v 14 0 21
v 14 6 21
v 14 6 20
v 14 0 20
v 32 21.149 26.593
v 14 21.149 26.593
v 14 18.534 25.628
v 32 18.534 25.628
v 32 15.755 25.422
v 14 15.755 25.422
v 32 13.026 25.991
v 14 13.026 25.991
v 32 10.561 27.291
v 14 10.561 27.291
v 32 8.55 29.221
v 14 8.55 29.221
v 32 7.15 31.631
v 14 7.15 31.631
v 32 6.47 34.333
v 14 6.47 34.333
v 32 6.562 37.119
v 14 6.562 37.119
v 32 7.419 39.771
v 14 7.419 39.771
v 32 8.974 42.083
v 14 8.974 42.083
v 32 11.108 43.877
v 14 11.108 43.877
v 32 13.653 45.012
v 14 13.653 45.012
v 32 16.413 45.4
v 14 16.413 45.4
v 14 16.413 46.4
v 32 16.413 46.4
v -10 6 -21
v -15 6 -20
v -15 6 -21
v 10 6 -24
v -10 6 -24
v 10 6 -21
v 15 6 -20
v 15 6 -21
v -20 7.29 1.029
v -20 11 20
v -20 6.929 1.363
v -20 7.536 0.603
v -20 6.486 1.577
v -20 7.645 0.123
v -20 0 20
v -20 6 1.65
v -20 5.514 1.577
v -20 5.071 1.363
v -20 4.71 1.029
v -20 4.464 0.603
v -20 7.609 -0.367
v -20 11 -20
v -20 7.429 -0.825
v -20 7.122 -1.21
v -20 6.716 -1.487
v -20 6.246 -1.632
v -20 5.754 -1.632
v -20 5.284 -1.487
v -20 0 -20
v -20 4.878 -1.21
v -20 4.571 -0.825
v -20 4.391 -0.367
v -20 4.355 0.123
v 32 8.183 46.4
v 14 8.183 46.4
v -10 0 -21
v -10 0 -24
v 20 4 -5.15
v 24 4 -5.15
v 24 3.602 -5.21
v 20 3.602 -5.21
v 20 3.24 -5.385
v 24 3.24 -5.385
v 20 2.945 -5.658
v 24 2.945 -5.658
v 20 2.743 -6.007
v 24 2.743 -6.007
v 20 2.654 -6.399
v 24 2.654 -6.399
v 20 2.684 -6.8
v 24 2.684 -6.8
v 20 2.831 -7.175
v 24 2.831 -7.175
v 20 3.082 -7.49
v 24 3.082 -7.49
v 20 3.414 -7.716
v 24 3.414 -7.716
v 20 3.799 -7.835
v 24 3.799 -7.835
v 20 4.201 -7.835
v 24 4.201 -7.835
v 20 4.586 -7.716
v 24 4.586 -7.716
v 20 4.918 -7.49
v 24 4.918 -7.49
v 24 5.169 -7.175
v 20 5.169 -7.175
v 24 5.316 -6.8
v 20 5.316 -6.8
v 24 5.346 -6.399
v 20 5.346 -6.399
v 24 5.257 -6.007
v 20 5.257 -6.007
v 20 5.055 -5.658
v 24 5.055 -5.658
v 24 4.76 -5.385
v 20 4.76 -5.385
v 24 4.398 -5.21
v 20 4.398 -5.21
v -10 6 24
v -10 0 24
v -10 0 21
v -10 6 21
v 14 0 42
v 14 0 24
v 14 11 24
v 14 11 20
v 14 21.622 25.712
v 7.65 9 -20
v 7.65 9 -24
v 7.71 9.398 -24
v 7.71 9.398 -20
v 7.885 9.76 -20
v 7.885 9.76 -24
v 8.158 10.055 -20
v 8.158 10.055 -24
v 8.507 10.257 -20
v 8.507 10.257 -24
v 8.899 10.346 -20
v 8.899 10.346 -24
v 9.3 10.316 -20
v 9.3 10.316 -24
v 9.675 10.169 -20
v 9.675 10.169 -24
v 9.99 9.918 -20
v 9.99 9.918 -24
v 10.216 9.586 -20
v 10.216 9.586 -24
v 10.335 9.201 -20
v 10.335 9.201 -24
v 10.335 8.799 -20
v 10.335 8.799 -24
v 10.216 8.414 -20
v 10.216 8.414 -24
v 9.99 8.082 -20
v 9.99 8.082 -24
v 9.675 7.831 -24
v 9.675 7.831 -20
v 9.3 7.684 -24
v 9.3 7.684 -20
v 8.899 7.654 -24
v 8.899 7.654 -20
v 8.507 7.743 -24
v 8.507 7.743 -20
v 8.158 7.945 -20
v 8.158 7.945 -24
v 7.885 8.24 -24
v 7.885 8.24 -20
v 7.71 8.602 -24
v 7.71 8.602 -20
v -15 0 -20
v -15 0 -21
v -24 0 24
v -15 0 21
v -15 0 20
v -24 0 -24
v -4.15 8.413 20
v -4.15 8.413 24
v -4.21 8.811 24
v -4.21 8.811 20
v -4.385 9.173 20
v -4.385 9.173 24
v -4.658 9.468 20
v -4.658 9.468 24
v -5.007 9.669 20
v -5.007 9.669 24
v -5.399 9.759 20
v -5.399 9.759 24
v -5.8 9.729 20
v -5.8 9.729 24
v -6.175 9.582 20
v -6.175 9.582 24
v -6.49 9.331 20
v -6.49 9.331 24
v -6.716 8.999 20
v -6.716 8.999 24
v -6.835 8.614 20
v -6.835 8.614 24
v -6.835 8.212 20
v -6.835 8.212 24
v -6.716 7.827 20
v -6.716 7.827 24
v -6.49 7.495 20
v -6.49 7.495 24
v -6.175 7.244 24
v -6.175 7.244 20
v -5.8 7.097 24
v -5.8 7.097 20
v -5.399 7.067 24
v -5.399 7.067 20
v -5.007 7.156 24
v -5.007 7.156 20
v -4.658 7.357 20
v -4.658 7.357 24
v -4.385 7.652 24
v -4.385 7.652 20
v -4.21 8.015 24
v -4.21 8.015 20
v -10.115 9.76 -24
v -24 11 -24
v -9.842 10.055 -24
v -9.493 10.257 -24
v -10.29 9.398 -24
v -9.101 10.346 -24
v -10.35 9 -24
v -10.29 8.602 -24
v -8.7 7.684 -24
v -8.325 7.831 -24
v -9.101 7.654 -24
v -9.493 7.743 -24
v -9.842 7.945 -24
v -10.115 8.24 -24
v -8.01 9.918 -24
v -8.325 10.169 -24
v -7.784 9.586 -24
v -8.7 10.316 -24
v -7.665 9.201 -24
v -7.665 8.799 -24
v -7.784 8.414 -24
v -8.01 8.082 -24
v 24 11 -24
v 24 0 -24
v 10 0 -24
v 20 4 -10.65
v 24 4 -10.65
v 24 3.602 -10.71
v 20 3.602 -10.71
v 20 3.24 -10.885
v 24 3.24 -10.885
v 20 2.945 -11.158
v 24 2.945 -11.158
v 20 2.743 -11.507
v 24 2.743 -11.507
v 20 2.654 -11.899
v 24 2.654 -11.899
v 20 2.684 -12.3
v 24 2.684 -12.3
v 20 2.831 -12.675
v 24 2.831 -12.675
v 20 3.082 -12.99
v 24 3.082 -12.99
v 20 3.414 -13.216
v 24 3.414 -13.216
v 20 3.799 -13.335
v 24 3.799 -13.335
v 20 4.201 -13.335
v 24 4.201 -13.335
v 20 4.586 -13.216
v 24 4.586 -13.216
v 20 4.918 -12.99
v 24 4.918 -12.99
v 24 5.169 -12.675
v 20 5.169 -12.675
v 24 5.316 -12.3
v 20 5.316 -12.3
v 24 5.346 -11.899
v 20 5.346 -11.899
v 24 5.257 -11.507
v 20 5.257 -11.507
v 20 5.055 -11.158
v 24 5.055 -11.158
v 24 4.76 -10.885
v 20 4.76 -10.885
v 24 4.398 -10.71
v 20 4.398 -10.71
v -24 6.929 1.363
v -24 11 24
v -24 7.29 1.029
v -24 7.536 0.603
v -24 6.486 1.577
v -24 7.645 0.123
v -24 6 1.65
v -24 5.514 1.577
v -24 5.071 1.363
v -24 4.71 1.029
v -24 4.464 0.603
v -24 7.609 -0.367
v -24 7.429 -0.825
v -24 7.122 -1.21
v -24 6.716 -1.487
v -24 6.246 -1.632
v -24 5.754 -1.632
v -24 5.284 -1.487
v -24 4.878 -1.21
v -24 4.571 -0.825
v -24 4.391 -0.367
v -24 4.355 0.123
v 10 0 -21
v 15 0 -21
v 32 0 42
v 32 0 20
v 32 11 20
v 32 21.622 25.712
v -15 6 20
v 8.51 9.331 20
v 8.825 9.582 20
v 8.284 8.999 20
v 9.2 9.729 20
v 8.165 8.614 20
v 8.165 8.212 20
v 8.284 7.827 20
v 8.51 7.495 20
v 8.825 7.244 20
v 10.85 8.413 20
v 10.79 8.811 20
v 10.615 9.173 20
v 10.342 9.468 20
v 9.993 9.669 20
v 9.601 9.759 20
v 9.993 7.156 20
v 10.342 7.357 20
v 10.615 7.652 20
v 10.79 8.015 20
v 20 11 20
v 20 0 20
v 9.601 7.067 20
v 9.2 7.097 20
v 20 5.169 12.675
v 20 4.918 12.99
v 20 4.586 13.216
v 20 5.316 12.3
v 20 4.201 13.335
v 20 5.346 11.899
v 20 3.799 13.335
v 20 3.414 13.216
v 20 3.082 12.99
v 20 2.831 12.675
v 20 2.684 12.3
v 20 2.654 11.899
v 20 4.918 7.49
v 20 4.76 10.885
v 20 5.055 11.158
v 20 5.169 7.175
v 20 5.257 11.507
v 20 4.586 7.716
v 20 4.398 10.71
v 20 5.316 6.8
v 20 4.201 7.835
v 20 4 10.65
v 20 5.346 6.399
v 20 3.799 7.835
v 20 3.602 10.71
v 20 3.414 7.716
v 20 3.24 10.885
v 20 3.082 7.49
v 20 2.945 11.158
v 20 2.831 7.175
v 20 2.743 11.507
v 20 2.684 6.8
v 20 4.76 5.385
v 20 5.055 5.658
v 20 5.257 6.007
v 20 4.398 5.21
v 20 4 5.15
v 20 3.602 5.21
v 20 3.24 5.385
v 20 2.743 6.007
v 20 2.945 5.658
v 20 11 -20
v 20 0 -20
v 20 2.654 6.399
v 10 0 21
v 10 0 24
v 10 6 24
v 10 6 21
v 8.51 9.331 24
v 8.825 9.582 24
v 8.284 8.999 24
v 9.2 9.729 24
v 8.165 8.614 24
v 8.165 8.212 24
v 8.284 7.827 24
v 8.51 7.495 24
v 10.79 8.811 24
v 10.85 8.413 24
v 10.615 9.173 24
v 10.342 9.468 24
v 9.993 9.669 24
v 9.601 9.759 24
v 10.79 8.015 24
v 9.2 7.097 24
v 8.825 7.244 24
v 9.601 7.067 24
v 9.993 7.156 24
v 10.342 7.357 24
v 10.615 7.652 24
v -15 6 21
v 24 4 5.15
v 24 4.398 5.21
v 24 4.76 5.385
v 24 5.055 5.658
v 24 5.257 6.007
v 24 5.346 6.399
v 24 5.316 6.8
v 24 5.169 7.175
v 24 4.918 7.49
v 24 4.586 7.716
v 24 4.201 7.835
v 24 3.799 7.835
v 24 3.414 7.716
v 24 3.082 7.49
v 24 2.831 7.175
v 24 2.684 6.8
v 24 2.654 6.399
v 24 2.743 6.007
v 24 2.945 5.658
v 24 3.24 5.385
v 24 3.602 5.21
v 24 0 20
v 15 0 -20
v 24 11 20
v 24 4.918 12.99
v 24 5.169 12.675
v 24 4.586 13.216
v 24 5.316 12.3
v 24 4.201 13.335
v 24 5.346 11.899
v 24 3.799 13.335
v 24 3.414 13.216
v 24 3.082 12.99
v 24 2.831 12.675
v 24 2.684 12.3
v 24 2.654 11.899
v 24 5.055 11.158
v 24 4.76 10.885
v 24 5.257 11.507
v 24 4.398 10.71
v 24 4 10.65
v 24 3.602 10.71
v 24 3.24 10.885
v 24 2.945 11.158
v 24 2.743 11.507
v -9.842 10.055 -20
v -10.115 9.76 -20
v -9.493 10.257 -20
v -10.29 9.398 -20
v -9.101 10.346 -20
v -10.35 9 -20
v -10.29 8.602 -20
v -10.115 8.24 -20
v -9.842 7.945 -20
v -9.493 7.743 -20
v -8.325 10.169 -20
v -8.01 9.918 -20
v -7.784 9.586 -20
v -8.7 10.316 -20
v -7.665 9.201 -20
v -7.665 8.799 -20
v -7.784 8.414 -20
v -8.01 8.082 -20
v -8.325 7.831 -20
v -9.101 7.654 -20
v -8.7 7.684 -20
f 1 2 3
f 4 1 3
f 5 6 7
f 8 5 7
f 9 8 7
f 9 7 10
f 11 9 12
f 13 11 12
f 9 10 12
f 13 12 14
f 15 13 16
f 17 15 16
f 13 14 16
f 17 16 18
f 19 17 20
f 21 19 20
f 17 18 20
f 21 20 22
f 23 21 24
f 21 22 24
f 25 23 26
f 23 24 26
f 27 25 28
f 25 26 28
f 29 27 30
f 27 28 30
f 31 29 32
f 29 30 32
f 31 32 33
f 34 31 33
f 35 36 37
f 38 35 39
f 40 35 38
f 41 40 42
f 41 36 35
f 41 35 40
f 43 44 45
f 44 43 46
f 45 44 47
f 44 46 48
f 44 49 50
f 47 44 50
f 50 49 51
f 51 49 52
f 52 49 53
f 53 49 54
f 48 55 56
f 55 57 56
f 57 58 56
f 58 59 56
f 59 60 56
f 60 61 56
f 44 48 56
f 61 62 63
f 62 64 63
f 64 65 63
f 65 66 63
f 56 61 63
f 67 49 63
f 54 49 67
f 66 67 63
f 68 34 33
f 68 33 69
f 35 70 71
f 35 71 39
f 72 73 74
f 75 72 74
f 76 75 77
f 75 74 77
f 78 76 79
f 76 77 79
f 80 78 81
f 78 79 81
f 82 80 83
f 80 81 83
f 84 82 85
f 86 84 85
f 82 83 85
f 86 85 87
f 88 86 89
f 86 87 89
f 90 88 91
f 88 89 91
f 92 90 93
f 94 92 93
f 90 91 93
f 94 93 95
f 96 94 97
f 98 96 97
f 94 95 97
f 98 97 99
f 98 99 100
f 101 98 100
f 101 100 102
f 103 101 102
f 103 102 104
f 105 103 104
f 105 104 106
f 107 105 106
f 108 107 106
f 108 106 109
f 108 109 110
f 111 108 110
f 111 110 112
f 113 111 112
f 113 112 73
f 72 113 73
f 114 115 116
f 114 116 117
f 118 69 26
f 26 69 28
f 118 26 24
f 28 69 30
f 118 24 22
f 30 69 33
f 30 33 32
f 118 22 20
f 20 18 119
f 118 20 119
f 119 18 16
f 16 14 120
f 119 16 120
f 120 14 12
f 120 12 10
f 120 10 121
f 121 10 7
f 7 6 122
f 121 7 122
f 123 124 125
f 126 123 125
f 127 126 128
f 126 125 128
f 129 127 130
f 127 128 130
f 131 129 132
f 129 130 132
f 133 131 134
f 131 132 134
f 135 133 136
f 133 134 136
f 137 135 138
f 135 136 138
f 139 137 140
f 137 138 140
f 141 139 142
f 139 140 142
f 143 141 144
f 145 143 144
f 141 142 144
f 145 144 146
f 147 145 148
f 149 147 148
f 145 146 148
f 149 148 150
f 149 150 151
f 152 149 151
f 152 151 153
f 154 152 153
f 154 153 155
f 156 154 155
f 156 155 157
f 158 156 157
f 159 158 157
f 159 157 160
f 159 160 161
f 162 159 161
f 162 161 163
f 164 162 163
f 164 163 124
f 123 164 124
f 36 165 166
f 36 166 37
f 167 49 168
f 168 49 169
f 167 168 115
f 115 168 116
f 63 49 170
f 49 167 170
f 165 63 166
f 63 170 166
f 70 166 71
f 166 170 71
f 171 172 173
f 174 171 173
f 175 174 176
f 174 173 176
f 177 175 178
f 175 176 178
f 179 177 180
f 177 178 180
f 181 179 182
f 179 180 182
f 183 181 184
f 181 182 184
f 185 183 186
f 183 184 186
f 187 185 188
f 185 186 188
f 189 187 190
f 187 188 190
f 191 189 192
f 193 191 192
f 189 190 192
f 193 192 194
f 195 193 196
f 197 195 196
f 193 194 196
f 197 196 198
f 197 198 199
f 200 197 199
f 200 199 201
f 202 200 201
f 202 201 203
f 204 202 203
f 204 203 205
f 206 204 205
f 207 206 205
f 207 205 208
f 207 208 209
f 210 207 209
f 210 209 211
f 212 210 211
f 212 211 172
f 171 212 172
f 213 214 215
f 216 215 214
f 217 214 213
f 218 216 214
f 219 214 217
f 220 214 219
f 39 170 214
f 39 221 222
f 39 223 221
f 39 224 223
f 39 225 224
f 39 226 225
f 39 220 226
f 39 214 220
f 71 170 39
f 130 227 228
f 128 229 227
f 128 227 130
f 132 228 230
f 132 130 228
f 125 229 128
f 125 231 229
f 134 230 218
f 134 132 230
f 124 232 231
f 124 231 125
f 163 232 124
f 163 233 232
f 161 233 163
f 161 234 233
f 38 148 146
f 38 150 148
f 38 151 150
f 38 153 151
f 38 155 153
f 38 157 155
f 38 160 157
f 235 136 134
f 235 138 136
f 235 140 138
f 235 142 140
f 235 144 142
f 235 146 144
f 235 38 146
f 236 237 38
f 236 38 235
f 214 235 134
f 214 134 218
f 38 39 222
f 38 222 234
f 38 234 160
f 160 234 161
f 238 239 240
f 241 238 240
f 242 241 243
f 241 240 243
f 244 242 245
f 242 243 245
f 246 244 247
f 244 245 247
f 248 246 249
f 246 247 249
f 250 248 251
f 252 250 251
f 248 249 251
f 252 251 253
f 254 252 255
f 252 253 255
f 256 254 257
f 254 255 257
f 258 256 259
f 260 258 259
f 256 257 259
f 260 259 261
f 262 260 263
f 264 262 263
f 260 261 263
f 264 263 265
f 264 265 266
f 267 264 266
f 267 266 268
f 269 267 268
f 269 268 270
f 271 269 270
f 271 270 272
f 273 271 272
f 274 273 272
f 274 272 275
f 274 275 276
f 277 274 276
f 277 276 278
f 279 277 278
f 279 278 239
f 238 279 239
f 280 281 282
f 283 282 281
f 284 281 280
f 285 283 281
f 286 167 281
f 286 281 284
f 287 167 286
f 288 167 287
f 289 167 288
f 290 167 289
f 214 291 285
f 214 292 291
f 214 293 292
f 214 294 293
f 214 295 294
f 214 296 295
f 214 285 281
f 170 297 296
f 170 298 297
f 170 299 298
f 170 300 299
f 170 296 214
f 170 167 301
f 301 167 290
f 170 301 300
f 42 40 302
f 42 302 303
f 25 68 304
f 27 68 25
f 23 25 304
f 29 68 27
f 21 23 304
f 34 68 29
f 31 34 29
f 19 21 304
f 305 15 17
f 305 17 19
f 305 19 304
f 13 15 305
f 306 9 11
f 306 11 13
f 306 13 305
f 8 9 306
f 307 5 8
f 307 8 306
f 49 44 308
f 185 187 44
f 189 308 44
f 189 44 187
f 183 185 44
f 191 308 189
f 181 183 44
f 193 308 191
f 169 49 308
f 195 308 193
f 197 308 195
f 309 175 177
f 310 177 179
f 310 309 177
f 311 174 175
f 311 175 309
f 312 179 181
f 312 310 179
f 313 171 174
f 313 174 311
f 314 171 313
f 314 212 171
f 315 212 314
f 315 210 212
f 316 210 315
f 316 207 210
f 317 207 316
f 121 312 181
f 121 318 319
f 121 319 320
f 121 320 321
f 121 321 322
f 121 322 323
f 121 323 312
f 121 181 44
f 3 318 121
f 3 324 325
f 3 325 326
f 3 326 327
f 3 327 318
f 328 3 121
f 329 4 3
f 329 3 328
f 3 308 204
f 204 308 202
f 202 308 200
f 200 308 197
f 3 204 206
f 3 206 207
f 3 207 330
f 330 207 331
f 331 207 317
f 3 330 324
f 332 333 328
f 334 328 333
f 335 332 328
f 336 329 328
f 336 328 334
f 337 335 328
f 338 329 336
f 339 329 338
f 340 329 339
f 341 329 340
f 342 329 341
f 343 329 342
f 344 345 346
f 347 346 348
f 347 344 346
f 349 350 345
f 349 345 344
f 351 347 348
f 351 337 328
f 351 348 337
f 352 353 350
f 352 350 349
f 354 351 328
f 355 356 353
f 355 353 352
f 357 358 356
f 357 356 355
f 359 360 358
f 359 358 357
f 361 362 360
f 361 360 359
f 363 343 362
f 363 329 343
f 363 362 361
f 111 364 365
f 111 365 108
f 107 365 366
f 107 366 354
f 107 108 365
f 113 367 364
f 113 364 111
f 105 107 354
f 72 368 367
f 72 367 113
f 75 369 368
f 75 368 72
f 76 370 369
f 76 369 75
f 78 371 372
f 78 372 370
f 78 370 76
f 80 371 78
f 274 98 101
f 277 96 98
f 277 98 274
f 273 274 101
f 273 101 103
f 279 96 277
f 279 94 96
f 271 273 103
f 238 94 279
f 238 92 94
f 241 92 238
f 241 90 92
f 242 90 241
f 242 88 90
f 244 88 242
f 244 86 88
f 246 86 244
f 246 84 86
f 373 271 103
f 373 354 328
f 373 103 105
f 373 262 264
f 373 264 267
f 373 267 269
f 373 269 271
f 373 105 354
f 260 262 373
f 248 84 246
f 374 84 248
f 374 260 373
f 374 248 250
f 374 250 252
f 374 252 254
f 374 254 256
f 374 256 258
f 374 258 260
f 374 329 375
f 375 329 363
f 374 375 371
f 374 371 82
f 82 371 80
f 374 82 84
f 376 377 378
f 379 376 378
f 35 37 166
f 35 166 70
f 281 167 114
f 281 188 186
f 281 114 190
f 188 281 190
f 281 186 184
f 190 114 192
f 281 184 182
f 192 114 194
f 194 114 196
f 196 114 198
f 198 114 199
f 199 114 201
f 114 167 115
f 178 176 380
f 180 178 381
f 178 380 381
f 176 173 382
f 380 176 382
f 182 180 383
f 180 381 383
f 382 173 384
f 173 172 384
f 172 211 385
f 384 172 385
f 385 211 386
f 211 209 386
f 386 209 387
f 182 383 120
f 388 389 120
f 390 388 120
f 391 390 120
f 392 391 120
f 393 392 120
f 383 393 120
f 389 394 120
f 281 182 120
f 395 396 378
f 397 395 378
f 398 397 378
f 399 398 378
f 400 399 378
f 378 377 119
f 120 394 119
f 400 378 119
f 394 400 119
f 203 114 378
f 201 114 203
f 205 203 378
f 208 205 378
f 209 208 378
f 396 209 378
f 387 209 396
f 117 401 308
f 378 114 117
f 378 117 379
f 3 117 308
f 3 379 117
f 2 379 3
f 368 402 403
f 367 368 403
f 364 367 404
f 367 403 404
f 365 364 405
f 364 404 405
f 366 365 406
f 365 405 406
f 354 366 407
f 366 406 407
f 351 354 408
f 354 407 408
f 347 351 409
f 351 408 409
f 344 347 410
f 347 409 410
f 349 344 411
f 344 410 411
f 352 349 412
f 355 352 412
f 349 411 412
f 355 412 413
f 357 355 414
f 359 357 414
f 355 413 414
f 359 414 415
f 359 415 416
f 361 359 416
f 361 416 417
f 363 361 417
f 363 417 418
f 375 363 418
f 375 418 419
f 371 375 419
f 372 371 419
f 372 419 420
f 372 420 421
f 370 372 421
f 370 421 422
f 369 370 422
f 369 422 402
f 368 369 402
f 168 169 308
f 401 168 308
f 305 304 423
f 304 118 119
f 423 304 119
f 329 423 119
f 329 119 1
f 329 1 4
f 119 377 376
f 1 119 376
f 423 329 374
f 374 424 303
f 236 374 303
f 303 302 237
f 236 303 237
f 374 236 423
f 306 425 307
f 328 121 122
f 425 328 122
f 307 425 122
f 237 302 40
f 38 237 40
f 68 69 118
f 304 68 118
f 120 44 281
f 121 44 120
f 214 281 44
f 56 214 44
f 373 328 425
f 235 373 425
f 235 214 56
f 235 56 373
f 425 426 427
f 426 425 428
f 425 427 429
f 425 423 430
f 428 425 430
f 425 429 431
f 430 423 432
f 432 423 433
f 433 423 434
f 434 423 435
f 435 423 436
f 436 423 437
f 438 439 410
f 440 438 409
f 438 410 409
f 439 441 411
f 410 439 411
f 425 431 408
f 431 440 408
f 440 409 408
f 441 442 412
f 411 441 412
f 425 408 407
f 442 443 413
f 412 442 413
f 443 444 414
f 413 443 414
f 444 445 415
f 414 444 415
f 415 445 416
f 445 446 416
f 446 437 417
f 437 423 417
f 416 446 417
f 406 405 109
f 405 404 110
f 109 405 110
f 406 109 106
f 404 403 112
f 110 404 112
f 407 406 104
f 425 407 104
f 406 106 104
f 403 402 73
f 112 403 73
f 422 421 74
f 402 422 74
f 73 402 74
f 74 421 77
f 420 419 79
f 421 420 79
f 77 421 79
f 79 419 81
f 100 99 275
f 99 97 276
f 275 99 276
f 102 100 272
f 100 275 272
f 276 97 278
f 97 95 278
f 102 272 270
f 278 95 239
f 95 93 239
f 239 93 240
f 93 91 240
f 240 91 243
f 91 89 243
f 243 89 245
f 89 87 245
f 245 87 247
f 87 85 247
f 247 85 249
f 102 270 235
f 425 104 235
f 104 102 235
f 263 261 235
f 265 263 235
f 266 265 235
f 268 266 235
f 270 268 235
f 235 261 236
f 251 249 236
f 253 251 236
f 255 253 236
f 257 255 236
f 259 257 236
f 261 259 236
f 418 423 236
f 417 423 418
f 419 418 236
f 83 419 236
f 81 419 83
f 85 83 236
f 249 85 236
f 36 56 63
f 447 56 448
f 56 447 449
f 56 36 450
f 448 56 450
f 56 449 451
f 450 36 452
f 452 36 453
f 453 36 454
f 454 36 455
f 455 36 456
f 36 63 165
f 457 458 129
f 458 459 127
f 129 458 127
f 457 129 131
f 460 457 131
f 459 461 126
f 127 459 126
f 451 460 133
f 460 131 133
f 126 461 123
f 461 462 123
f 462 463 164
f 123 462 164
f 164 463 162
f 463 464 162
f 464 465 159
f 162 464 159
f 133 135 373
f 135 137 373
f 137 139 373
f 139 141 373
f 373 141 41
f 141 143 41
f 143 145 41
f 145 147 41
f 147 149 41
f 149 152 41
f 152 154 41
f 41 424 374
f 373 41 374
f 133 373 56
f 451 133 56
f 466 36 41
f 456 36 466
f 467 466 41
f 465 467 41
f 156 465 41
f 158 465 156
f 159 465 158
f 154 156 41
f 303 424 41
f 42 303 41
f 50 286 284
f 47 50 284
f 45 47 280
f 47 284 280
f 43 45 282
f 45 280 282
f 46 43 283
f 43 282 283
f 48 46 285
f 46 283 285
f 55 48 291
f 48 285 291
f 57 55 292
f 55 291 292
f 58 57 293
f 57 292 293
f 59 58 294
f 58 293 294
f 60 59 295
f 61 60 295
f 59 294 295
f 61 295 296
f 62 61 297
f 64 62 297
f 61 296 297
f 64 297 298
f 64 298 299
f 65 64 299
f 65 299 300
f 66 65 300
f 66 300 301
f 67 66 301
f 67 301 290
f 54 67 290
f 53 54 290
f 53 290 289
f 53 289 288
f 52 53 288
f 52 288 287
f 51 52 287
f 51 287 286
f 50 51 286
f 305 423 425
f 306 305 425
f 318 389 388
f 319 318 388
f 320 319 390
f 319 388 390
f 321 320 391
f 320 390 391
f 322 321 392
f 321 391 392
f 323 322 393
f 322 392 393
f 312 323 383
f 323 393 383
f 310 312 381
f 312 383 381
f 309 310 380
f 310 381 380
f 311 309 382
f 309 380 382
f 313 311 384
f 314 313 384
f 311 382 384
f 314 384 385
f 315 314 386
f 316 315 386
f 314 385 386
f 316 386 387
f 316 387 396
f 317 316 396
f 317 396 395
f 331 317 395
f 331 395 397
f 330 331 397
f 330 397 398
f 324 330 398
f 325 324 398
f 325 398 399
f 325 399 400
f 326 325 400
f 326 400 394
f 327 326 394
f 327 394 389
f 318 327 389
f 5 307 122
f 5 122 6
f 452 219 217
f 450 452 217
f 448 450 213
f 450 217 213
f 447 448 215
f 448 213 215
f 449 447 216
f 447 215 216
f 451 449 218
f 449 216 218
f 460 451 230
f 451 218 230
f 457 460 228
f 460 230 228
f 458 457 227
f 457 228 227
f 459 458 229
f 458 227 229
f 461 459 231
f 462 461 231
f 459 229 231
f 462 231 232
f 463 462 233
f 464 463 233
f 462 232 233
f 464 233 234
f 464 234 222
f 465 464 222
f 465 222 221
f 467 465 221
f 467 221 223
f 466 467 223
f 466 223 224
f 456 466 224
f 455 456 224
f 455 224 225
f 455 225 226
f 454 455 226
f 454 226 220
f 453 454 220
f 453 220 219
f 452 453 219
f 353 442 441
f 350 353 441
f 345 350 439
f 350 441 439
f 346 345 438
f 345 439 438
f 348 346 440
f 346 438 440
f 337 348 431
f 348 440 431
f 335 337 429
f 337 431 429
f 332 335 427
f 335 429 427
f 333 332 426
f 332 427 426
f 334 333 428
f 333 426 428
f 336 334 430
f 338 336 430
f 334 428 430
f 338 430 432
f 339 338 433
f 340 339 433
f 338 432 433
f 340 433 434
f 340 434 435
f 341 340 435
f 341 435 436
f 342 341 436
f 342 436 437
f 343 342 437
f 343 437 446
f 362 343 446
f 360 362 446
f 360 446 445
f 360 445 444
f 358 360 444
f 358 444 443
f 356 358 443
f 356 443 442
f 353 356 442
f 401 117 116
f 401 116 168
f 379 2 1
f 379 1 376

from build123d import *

# Parameters (mm, degrees)
SKETCH1_W                = 48
SKETCH1_H                = 48
SKETCH1_W_2              = 40
SKETCH1_H_2              = 40
BOSS_EXTRUDE1_DEPTH      = 11
SKETCH3_W                = 20
SKETCH3_H                = 6
CUT_EXTRUDE1_DEPTH       = 55.781383699
SKETCH4_W                = 5
SKETCH4_H                = 6
CUT_EXTRUDE2_DEPTH       = 1
SKETCH5_W                = 5
SKETCH5_H                = 6
CUT_EXTRUDE3_DEPTH       = 1
CUT_EXTRUDE4_REACH       = 56.781
SKETCH6_R                = 1.35
CUT_EXTRUDE5_REACH       = 56.781
SKETCH7_R                = 1.35
CUT_EXTRUDE6_REACH       = 56.781
SKETCH8_R                = 1.35
CUT_EXTRUDE7_REACH       = 56.781
SKETCH9_R                = 1.65
BOSS_EXTRUDE7_DEPTH      = 8
BOSS_EXTRUDE7_DEPTH_BACK = 10


with BuildPart() as part:
    # Sketch1 → Boss-Extrude1 (new body)
    with BuildSketch(Plane(origin=(0, 0, 0), x_dir=(1, 0, 0), z_dir=(0, 1, 0))):
        Rectangle(SKETCH1_W, SKETCH1_H)
        Rectangle(SKETCH1_W_2, SKETCH1_H_2, mode=Mode.SUBTRACT)
    extrude(amount=BOSS_EXTRUDE1_DEPTH)

    # Sketch3 → Cut-Extrude1 (cut, through all)
    with BuildSketch(Plane.XY.offset(24)):
        with Locations((0, 3)):
            Rectangle(SKETCH3_W, SKETCH3_H)
    extrude(amount=-CUT_EXTRUDE1_DEPTH, mode=Mode.SUBTRACT)

    # Sketch4 → Cut-Extrude2 (cut)
    with BuildSketch(Plane.XY.offset(-20)):
        with Locations((-12.5, 3)):
            Rectangle(SKETCH4_W, SKETCH4_H)
        with Locations((12.5, 3)):
            Rectangle(SKETCH4_W, SKETCH4_H)
    extrude(amount=-CUT_EXTRUDE2_DEPTH, mode=Mode.SUBTRACT)

    # Sketch5 → Cut-Extrude3 (cut)
    with BuildSketch(Plane(origin=(0, 0, 20), x_dir=(-1, 0, 0), z_dir=(0, 0, -1))):
        with Locations((-12.5, 3)):
            Rectangle(SKETCH5_W, SKETCH5_H)
        with Locations((12.5, 3)):
            Rectangle(SKETCH5_W, SKETCH5_H)
    extrude(amount=-CUT_EXTRUDE3_DEPTH, mode=Mode.SUBTRACT)

    # Sketch6 → Cut-Extrude4 (cut, up to next)
    with BuildSketch(Plane(origin=(0, 0, -24), x_dir=(-1, 0, 0), z_dir=(0, 0, -1)), mode=Mode.PRIVATE) as cut_extrude4_sk1:
        with Locations((-9, 9)):
            Circle(SKETCH6_R)
    cut_extrude4_tool1 = extrude(cut_extrude4_sk1.sketch, amount=-CUT_EXTRUDE4_REACH, mode=Mode.PRIVATE) & part.part
    # Sketch6 → Cut-Extrude4 (cut, up to next)
    with BuildSketch(Plane(origin=(0, 0, -24), x_dir=(-1, 0, 0), z_dir=(0, 0, -1)), mode=Mode.PRIVATE) as cut_extrude4_sk2:
        with Locations((9, 9)):
            Circle(SKETCH6_R)
    cut_extrude4_tool2 = extrude(cut_extrude4_sk2.sketch, amount=-CUT_EXTRUDE4_REACH, mode=Mode.PRIVATE) & part.part
    add(cut_extrude4_tool1.solids().sort_by_distance((9, 9, -24))[0], mode=Mode.SUBTRACT)
    add(cut_extrude4_tool2.solids().sort_by_distance((-9, 9, -24))[0], mode=Mode.SUBTRACT)

    # Sketch7 → Cut-Extrude5 (cut, up to next)
    with BuildSketch(Plane.XY.offset(24), mode=Mode.PRIVATE) as cut_extrude5_sk1:
        with Locations((9.5, 8.412816521)):
            Circle(SKETCH7_R)
    cut_extrude5_tool1 = extrude(cut_extrude5_sk1.sketch, amount=-CUT_EXTRUDE5_REACH, mode=Mode.PRIVATE) & part.part
    # Sketch7 → Cut-Extrude5 (cut, up to next)
    with BuildSketch(Plane.XY.offset(24), mode=Mode.PRIVATE) as cut_extrude5_sk2:
        with Locations((-5.5, 8.412816521)):
            Circle(SKETCH7_R)
    cut_extrude5_tool2 = extrude(cut_extrude5_sk2.sketch, amount=-CUT_EXTRUDE5_REACH, mode=Mode.PRIVATE) & part.part
    add(cut_extrude5_tool1.solids().sort_by_distance((9.5, 8.412817, 24))[0], mode=Mode.SUBTRACT)
    add(cut_extrude5_tool2.solids().sort_by_distance((-5.5, 8.412817, 24))[0], mode=Mode.SUBTRACT)

    # Sketch8 → Cut-Extrude6 (cut, up to next)
    with BuildSketch(Plane(origin=(24, 0, 0), x_dir=(0, 0, -1), z_dir=(1, 0, 0)), mode=Mode.PRIVATE) as cut_extrude6_sk1:
        with Locations((-12, 4)):
            Circle(SKETCH8_R)
    cut_extrude6_tool1 = extrude(cut_extrude6_sk1.sketch, amount=-CUT_EXTRUDE6_REACH, mode=Mode.PRIVATE) & part.part
    # Sketch8 → Cut-Extrude6 (cut, up to next)
    with BuildSketch(Plane(origin=(24, 0, 0), x_dir=(0, 0, -1), z_dir=(1, 0, 0)), mode=Mode.PRIVATE) as cut_extrude6_sk2:
        with Locations((-6.5, 4)):
            Circle(SKETCH8_R)
    cut_extrude6_tool2 = extrude(cut_extrude6_sk2.sketch, amount=-CUT_EXTRUDE6_REACH, mode=Mode.PRIVATE) & part.part
    # Sketch8 → Cut-Extrude6 (cut, up to next)
    with BuildSketch(Plane(origin=(24, 0, 0), x_dir=(0, 0, -1), z_dir=(1, 0, 0)), mode=Mode.PRIVATE) as cut_extrude6_sk3:
        with Locations(Location((6.5, 4, 0), (0, 0, 180))):
            Circle(SKETCH8_R)
    cut_extrude6_tool3 = extrude(cut_extrude6_sk3.sketch, amount=-CUT_EXTRUDE6_REACH, mode=Mode.PRIVATE) & part.part
    # Sketch8 → Cut-Extrude6 (cut, up to next)
    with BuildSketch(Plane(origin=(24, 0, 0), x_dir=(0, 0, -1), z_dir=(1, 0, 0)), mode=Mode.PRIVATE) as cut_extrude6_sk4:
        with Locations(Location((12, 4, 0), (0, 0, 180))):
            Circle(SKETCH8_R)
    cut_extrude6_tool4 = extrude(cut_extrude6_sk4.sketch, amount=-CUT_EXTRUDE6_REACH, mode=Mode.PRIVATE) & part.part
    add(cut_extrude6_tool1.solids().sort_by_distance((24, 4, 12))[0], mode=Mode.SUBTRACT)
    add(cut_extrude6_tool2.solids().sort_by_distance((24, 4, 6.5))[0], mode=Mode.SUBTRACT)
    add(cut_extrude6_tool3.solids().sort_by_distance((24, 4, -6.5))[0], mode=Mode.SUBTRACT)
    add(cut_extrude6_tool4.solids().sort_by_distance((24, 4, -12))[0], mode=Mode.SUBTRACT)

    # Sketch9 → Cut-Extrude7 (cut, up to next)
    with BuildSketch(Plane.ZY.offset(24), mode=Mode.PRIVATE) as cut_extrude7_sk1:
        with Locations((0, 6)):
            Circle(SKETCH9_R)
    cut_extrude7_tool1 = extrude(cut_extrude7_sk1.sketch, amount=-CUT_EXTRUDE7_REACH, mode=Mode.PRIVATE) & part.part
    add(cut_extrude7_tool1.solids().sort_by_distance((-24, 6, 0))[0], mode=Mode.SUBTRACT)

    # Sketch10 → Boss-Extrude7 (add, two sides: drawn at the far end of the back side and taken through both)
    with BuildSketch(Plane(origin=(24, 0, 0), x_dir=(0, 0, -1), z_dir=(1, 0, 0)).offset(-BOSS_EXTRUDE7_DEPTH_BACK)):
        with BuildLine():
            Line((-42, 0), (-20, 0))
            Line((-20, 0), (-20, 11))
            Line((-20, 11), (-25.711810571, 21.622325672))
            ThreePointArc((-25.711810571, 21.622325672), (-32.713932588, 5.745809356), (-46.4, 16.412816521))
            Line((-46.4, 16.412816521), (-46.4, 8.182735119))
            Line((-46.4, 8.182735119), (-42, 0))
        make_face()
        with BuildLine():
            ThreePointArc((-46.4, 16.412816521), (-32.713932588, 5.745809356), (-25.711810571, 21.622325672))
            Line((-25.711810571, 21.622325672), (-26.592555065, 21.148733931))
            ThreePointArc((-26.592555065, 21.148733931), (-32.958120534, 6.71553728), (-45.4, 16.412816521))
            Line((-45.4, 16.412816521), (-46.4, 16.412816521))
        make_face()
    extrude(amount=BOSS_EXTRUDE7_DEPTH + BOSS_EXTRUDE7_DEPTH_BACK)


solid = part.part
